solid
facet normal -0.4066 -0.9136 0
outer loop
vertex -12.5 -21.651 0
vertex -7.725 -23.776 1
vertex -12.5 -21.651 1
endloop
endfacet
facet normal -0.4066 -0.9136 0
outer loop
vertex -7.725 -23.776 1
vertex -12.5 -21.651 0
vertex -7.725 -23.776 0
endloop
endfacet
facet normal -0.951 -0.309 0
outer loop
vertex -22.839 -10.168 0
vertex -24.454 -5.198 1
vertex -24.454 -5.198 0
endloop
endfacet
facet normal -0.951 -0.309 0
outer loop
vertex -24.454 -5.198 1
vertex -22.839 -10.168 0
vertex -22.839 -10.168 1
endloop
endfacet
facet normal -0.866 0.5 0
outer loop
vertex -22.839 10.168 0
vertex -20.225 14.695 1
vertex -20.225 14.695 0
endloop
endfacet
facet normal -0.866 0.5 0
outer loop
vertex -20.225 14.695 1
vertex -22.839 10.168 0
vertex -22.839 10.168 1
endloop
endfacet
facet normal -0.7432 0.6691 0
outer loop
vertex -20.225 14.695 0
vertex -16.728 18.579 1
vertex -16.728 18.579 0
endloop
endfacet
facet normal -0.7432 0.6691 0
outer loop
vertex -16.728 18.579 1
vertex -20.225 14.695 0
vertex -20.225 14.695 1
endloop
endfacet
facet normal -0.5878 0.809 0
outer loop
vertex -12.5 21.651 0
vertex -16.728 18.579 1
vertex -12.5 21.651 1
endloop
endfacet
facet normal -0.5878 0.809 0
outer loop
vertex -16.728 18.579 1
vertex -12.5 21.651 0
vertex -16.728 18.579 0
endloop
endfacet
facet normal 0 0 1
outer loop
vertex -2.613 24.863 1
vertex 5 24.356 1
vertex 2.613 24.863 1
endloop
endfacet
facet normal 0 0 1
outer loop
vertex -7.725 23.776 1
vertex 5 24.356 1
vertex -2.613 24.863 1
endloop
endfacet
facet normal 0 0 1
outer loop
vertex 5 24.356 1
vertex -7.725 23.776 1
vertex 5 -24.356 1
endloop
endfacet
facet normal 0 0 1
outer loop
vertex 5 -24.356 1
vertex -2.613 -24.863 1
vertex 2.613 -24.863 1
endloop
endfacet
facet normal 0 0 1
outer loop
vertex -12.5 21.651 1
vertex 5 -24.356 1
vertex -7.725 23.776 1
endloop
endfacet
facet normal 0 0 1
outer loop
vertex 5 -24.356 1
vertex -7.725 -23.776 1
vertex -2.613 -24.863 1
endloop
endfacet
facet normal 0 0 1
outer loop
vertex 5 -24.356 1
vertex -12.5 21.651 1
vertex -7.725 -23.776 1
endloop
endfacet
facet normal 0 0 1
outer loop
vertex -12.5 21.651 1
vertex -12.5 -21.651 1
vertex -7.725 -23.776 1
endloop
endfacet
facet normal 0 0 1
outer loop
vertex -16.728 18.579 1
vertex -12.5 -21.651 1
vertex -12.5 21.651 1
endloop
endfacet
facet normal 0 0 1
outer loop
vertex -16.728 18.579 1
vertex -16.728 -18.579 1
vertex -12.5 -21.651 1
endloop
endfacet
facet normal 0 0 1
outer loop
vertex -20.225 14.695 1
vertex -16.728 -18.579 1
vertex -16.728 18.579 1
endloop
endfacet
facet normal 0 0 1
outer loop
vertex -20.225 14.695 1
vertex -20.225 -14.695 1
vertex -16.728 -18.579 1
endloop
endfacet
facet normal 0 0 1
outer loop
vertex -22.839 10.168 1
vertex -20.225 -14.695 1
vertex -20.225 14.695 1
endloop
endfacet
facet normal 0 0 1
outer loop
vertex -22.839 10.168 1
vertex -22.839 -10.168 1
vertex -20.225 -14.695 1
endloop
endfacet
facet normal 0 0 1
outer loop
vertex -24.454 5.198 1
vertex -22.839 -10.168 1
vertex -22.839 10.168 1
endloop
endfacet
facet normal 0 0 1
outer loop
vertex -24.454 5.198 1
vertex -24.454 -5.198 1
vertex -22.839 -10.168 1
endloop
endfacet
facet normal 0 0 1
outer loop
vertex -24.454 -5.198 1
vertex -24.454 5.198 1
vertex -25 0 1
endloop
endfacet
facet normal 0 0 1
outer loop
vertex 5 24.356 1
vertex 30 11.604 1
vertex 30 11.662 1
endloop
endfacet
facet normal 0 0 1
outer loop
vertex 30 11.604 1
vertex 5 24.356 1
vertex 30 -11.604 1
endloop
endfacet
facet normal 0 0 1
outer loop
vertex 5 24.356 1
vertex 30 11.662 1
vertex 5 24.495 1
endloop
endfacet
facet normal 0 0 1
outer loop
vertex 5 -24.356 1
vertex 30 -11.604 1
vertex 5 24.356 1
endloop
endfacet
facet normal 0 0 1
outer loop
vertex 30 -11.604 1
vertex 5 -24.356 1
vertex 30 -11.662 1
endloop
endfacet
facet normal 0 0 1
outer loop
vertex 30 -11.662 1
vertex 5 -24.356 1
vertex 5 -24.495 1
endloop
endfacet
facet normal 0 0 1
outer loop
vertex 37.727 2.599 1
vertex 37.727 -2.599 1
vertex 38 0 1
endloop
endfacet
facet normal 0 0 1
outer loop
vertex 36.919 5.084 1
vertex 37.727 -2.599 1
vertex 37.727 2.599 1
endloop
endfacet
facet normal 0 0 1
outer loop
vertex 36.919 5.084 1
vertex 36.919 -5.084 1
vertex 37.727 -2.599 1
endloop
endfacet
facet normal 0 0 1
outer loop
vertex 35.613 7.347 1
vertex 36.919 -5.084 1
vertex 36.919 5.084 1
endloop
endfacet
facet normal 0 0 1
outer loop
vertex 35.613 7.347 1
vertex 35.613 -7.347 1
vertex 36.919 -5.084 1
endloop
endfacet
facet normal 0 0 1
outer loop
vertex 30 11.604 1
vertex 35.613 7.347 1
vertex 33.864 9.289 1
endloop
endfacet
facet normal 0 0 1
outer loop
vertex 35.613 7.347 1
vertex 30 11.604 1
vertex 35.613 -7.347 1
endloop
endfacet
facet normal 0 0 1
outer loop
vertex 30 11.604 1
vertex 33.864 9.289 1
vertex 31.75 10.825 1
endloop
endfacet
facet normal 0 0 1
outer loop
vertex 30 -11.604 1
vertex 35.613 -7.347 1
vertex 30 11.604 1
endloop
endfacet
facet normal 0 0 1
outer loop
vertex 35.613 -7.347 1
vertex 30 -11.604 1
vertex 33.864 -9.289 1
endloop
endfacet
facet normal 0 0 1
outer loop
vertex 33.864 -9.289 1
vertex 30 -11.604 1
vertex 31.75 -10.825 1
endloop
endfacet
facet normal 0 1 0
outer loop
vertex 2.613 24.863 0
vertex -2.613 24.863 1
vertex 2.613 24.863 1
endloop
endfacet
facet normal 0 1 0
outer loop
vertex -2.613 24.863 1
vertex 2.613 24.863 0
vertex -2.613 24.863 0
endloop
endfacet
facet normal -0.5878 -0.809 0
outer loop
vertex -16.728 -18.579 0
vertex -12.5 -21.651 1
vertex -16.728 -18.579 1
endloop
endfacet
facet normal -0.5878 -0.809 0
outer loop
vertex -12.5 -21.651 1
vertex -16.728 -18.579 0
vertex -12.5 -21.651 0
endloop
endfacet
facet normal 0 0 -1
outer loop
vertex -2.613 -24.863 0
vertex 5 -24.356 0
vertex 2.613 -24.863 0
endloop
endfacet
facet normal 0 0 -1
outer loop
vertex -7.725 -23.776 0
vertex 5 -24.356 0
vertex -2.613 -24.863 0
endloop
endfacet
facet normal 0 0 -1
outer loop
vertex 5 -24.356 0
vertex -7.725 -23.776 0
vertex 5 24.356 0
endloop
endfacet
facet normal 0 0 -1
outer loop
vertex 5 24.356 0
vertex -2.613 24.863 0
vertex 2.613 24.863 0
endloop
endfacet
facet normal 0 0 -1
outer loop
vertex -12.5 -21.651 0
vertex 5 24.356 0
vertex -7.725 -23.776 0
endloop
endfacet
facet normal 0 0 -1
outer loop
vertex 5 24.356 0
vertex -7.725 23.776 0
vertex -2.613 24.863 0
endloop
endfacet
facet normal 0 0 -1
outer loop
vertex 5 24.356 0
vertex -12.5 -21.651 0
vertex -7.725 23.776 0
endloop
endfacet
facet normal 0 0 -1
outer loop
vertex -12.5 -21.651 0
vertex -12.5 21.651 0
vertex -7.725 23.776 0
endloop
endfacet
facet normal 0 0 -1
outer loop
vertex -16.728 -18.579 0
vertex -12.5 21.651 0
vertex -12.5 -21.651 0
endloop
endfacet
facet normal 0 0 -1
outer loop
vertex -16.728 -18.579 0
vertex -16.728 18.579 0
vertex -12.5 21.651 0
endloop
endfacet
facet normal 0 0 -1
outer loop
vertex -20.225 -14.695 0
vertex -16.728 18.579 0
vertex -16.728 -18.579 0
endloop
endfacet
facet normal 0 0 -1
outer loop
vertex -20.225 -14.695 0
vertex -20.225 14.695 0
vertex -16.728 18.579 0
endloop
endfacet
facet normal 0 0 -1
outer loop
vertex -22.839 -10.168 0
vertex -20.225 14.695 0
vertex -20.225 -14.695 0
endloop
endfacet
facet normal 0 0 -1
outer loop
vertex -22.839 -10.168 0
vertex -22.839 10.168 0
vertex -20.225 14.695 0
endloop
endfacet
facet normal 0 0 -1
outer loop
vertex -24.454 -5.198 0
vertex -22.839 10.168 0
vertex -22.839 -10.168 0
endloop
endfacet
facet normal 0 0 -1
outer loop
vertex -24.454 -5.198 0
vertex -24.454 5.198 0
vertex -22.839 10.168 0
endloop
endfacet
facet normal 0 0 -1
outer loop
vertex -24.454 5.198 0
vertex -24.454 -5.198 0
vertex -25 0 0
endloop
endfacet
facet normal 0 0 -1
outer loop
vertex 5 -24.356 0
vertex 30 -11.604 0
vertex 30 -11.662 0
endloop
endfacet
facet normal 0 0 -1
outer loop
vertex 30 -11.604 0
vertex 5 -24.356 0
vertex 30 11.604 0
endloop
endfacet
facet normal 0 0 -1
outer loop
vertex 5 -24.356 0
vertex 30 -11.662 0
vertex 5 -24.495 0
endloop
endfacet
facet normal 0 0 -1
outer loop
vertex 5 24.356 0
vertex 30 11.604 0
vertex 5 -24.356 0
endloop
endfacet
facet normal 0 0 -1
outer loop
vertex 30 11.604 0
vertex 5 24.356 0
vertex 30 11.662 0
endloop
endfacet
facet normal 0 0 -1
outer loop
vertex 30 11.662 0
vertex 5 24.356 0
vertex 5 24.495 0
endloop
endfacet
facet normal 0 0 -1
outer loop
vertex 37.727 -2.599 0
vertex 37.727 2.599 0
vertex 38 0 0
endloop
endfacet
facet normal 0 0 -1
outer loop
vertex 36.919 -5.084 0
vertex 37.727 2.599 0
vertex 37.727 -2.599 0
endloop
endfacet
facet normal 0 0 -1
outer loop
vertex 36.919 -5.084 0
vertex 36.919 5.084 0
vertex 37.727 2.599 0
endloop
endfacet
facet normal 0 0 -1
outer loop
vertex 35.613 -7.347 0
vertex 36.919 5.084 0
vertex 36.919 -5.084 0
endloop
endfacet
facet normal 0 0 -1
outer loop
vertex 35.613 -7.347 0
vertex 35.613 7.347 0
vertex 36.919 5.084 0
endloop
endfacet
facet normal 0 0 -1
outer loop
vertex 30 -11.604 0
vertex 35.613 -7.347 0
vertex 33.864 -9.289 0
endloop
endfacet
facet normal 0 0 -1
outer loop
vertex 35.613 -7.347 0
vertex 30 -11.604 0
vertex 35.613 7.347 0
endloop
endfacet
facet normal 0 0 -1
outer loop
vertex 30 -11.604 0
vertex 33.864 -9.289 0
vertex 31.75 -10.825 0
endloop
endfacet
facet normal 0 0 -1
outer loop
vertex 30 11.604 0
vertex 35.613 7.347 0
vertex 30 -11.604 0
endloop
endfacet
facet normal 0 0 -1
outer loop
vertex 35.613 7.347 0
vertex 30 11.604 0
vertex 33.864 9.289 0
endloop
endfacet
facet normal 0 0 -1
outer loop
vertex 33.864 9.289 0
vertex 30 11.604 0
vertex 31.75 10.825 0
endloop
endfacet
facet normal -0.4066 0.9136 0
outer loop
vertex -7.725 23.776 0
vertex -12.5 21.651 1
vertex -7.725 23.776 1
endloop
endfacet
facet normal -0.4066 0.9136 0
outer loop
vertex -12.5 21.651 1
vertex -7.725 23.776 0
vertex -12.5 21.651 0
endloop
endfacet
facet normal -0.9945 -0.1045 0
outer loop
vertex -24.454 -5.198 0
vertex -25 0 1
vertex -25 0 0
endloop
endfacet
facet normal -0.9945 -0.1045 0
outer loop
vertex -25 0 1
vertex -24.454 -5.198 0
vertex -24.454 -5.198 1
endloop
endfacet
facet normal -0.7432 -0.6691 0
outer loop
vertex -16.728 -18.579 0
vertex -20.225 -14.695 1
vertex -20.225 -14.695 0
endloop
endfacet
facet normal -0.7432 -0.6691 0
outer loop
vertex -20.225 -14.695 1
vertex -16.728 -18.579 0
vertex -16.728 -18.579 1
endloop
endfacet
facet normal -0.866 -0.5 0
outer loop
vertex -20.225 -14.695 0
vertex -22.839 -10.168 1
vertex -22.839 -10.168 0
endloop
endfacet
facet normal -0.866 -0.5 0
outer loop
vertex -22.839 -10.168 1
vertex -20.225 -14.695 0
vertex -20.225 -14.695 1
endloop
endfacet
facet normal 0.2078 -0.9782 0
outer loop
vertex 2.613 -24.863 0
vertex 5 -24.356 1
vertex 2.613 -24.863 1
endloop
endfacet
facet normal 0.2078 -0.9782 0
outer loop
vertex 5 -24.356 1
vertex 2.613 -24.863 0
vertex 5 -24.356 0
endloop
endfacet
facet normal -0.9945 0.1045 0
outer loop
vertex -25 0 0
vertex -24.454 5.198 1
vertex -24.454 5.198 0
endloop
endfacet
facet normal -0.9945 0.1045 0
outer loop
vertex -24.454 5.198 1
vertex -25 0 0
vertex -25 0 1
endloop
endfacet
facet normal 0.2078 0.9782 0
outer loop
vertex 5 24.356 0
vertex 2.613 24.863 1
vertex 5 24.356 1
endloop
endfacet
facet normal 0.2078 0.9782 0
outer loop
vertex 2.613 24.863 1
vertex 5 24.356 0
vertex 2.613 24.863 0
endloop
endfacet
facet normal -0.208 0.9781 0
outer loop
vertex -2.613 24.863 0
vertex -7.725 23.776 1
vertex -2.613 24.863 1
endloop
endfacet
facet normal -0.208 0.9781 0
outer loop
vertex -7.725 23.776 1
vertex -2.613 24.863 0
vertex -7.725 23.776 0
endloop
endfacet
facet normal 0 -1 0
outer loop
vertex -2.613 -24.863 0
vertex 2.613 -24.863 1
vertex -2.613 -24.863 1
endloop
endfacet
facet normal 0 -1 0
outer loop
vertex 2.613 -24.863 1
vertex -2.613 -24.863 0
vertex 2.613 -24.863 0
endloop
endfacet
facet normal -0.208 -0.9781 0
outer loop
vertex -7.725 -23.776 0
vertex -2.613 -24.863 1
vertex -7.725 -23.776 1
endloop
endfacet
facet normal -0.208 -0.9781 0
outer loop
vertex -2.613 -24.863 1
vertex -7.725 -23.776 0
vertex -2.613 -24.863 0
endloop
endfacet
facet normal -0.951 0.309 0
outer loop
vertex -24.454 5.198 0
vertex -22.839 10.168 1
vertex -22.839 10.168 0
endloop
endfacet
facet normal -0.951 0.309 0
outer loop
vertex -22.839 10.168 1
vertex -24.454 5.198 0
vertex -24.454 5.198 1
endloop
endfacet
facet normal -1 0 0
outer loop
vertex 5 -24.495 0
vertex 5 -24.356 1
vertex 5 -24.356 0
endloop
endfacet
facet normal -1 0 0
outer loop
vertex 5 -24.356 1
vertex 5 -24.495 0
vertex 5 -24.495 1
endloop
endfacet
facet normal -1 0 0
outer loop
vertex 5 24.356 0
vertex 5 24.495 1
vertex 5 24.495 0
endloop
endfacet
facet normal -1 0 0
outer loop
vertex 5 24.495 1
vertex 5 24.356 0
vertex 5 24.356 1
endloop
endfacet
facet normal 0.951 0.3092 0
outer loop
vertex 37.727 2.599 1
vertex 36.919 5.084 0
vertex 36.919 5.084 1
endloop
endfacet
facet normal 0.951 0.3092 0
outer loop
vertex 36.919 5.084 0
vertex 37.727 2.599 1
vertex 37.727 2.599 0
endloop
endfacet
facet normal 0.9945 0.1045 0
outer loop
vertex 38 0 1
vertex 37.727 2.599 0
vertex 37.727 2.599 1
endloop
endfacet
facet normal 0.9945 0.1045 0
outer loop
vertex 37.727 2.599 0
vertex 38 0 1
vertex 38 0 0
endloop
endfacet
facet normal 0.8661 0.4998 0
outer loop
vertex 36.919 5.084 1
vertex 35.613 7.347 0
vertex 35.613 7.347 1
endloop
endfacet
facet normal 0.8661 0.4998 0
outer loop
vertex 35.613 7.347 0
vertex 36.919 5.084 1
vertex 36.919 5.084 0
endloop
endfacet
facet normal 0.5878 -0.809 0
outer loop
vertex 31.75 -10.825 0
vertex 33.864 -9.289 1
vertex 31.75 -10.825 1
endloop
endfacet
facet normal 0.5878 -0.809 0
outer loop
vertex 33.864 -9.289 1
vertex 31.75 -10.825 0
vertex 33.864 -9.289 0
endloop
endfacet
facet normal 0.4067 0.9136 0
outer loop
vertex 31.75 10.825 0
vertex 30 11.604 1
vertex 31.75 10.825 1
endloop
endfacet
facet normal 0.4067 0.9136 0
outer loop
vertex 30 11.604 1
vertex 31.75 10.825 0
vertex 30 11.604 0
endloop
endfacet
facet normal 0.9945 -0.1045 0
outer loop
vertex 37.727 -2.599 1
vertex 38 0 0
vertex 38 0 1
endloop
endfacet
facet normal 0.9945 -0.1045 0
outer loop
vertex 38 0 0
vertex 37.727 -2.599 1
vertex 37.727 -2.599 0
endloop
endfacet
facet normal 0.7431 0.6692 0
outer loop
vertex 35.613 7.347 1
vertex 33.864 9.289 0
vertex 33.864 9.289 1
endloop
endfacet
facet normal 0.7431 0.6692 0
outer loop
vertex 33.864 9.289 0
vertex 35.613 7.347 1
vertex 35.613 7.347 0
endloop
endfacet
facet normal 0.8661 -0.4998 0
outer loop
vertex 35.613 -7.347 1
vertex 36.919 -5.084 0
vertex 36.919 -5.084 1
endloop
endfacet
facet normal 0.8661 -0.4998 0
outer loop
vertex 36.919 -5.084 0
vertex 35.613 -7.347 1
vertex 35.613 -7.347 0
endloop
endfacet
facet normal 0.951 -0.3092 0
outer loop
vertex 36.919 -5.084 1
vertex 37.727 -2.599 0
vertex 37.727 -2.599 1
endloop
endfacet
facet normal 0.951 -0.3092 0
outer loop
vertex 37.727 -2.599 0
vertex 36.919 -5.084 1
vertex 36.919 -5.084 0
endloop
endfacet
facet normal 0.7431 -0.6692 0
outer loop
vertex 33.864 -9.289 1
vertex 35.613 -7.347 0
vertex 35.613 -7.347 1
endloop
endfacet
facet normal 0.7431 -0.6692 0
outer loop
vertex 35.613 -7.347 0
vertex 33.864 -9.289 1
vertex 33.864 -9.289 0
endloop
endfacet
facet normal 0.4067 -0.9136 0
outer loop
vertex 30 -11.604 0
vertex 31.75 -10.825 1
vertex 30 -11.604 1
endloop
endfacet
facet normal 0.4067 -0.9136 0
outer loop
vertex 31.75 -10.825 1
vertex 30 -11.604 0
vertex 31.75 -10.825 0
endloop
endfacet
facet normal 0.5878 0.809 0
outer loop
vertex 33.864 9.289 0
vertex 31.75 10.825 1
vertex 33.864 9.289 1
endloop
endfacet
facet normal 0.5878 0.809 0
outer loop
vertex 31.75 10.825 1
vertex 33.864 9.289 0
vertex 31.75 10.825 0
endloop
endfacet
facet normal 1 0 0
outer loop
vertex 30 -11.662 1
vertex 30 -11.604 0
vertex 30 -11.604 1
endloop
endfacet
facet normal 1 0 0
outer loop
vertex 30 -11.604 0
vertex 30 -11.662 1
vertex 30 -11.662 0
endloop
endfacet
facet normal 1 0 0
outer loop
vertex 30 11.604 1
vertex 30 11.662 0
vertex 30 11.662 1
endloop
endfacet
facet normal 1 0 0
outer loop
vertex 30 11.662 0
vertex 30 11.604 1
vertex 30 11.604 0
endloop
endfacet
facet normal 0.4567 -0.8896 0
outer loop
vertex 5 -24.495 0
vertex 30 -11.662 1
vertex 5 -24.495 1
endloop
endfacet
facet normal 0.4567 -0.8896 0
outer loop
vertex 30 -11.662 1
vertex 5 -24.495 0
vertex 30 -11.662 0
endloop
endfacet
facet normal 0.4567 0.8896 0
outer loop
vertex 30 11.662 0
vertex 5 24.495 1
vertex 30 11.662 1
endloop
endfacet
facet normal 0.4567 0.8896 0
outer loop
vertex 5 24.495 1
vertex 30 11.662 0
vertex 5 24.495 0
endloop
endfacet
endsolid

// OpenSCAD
union() {
    difference() {
        cylinder(h=1, r=25);
        translate([30, 0, 0])
            cube(size = [50, 50, 4], center = true);
    }

    width = sqrt(pow(25, 2)-pow(5,2));
    width2 = sqrt(pow(12.5, 2)-pow(4.5,2));

    CubePoints = [
    [  0,  -width,  0 ],  //0
    [ 25,  -width2,  0 ],  //1
    [ 25,  width2,  0 ],  //2
    [  0,  width,  0 ],  //3
    [  0,  -width,  1 ],  //4
    [ 25,  -width2,  1 ],  //5
    [ 25,  width2,  1 ],  //6
    [  0,  width,  1 ]]; //7
  
    CubeFaces = [
    [0,1,2,3],  // bottom
    [4,5,1,0],  // front
    [7,6,5,4],  // top
    [5,6,2,1],  // right
    [6,7,3,2],  // back
    [7,4,0,3]]; // left

    translate([5, 0, 0])  
        polyhedron( CubePoints, CubeFaces );

    translate([5+25-4.5, 0, 0]) {
        difference() {
            cylinder(h=1, r=12.5);
            translate([-8, 0, 1])
                cube(size = [25, 25, 4], center = true);
        }
    }
}
